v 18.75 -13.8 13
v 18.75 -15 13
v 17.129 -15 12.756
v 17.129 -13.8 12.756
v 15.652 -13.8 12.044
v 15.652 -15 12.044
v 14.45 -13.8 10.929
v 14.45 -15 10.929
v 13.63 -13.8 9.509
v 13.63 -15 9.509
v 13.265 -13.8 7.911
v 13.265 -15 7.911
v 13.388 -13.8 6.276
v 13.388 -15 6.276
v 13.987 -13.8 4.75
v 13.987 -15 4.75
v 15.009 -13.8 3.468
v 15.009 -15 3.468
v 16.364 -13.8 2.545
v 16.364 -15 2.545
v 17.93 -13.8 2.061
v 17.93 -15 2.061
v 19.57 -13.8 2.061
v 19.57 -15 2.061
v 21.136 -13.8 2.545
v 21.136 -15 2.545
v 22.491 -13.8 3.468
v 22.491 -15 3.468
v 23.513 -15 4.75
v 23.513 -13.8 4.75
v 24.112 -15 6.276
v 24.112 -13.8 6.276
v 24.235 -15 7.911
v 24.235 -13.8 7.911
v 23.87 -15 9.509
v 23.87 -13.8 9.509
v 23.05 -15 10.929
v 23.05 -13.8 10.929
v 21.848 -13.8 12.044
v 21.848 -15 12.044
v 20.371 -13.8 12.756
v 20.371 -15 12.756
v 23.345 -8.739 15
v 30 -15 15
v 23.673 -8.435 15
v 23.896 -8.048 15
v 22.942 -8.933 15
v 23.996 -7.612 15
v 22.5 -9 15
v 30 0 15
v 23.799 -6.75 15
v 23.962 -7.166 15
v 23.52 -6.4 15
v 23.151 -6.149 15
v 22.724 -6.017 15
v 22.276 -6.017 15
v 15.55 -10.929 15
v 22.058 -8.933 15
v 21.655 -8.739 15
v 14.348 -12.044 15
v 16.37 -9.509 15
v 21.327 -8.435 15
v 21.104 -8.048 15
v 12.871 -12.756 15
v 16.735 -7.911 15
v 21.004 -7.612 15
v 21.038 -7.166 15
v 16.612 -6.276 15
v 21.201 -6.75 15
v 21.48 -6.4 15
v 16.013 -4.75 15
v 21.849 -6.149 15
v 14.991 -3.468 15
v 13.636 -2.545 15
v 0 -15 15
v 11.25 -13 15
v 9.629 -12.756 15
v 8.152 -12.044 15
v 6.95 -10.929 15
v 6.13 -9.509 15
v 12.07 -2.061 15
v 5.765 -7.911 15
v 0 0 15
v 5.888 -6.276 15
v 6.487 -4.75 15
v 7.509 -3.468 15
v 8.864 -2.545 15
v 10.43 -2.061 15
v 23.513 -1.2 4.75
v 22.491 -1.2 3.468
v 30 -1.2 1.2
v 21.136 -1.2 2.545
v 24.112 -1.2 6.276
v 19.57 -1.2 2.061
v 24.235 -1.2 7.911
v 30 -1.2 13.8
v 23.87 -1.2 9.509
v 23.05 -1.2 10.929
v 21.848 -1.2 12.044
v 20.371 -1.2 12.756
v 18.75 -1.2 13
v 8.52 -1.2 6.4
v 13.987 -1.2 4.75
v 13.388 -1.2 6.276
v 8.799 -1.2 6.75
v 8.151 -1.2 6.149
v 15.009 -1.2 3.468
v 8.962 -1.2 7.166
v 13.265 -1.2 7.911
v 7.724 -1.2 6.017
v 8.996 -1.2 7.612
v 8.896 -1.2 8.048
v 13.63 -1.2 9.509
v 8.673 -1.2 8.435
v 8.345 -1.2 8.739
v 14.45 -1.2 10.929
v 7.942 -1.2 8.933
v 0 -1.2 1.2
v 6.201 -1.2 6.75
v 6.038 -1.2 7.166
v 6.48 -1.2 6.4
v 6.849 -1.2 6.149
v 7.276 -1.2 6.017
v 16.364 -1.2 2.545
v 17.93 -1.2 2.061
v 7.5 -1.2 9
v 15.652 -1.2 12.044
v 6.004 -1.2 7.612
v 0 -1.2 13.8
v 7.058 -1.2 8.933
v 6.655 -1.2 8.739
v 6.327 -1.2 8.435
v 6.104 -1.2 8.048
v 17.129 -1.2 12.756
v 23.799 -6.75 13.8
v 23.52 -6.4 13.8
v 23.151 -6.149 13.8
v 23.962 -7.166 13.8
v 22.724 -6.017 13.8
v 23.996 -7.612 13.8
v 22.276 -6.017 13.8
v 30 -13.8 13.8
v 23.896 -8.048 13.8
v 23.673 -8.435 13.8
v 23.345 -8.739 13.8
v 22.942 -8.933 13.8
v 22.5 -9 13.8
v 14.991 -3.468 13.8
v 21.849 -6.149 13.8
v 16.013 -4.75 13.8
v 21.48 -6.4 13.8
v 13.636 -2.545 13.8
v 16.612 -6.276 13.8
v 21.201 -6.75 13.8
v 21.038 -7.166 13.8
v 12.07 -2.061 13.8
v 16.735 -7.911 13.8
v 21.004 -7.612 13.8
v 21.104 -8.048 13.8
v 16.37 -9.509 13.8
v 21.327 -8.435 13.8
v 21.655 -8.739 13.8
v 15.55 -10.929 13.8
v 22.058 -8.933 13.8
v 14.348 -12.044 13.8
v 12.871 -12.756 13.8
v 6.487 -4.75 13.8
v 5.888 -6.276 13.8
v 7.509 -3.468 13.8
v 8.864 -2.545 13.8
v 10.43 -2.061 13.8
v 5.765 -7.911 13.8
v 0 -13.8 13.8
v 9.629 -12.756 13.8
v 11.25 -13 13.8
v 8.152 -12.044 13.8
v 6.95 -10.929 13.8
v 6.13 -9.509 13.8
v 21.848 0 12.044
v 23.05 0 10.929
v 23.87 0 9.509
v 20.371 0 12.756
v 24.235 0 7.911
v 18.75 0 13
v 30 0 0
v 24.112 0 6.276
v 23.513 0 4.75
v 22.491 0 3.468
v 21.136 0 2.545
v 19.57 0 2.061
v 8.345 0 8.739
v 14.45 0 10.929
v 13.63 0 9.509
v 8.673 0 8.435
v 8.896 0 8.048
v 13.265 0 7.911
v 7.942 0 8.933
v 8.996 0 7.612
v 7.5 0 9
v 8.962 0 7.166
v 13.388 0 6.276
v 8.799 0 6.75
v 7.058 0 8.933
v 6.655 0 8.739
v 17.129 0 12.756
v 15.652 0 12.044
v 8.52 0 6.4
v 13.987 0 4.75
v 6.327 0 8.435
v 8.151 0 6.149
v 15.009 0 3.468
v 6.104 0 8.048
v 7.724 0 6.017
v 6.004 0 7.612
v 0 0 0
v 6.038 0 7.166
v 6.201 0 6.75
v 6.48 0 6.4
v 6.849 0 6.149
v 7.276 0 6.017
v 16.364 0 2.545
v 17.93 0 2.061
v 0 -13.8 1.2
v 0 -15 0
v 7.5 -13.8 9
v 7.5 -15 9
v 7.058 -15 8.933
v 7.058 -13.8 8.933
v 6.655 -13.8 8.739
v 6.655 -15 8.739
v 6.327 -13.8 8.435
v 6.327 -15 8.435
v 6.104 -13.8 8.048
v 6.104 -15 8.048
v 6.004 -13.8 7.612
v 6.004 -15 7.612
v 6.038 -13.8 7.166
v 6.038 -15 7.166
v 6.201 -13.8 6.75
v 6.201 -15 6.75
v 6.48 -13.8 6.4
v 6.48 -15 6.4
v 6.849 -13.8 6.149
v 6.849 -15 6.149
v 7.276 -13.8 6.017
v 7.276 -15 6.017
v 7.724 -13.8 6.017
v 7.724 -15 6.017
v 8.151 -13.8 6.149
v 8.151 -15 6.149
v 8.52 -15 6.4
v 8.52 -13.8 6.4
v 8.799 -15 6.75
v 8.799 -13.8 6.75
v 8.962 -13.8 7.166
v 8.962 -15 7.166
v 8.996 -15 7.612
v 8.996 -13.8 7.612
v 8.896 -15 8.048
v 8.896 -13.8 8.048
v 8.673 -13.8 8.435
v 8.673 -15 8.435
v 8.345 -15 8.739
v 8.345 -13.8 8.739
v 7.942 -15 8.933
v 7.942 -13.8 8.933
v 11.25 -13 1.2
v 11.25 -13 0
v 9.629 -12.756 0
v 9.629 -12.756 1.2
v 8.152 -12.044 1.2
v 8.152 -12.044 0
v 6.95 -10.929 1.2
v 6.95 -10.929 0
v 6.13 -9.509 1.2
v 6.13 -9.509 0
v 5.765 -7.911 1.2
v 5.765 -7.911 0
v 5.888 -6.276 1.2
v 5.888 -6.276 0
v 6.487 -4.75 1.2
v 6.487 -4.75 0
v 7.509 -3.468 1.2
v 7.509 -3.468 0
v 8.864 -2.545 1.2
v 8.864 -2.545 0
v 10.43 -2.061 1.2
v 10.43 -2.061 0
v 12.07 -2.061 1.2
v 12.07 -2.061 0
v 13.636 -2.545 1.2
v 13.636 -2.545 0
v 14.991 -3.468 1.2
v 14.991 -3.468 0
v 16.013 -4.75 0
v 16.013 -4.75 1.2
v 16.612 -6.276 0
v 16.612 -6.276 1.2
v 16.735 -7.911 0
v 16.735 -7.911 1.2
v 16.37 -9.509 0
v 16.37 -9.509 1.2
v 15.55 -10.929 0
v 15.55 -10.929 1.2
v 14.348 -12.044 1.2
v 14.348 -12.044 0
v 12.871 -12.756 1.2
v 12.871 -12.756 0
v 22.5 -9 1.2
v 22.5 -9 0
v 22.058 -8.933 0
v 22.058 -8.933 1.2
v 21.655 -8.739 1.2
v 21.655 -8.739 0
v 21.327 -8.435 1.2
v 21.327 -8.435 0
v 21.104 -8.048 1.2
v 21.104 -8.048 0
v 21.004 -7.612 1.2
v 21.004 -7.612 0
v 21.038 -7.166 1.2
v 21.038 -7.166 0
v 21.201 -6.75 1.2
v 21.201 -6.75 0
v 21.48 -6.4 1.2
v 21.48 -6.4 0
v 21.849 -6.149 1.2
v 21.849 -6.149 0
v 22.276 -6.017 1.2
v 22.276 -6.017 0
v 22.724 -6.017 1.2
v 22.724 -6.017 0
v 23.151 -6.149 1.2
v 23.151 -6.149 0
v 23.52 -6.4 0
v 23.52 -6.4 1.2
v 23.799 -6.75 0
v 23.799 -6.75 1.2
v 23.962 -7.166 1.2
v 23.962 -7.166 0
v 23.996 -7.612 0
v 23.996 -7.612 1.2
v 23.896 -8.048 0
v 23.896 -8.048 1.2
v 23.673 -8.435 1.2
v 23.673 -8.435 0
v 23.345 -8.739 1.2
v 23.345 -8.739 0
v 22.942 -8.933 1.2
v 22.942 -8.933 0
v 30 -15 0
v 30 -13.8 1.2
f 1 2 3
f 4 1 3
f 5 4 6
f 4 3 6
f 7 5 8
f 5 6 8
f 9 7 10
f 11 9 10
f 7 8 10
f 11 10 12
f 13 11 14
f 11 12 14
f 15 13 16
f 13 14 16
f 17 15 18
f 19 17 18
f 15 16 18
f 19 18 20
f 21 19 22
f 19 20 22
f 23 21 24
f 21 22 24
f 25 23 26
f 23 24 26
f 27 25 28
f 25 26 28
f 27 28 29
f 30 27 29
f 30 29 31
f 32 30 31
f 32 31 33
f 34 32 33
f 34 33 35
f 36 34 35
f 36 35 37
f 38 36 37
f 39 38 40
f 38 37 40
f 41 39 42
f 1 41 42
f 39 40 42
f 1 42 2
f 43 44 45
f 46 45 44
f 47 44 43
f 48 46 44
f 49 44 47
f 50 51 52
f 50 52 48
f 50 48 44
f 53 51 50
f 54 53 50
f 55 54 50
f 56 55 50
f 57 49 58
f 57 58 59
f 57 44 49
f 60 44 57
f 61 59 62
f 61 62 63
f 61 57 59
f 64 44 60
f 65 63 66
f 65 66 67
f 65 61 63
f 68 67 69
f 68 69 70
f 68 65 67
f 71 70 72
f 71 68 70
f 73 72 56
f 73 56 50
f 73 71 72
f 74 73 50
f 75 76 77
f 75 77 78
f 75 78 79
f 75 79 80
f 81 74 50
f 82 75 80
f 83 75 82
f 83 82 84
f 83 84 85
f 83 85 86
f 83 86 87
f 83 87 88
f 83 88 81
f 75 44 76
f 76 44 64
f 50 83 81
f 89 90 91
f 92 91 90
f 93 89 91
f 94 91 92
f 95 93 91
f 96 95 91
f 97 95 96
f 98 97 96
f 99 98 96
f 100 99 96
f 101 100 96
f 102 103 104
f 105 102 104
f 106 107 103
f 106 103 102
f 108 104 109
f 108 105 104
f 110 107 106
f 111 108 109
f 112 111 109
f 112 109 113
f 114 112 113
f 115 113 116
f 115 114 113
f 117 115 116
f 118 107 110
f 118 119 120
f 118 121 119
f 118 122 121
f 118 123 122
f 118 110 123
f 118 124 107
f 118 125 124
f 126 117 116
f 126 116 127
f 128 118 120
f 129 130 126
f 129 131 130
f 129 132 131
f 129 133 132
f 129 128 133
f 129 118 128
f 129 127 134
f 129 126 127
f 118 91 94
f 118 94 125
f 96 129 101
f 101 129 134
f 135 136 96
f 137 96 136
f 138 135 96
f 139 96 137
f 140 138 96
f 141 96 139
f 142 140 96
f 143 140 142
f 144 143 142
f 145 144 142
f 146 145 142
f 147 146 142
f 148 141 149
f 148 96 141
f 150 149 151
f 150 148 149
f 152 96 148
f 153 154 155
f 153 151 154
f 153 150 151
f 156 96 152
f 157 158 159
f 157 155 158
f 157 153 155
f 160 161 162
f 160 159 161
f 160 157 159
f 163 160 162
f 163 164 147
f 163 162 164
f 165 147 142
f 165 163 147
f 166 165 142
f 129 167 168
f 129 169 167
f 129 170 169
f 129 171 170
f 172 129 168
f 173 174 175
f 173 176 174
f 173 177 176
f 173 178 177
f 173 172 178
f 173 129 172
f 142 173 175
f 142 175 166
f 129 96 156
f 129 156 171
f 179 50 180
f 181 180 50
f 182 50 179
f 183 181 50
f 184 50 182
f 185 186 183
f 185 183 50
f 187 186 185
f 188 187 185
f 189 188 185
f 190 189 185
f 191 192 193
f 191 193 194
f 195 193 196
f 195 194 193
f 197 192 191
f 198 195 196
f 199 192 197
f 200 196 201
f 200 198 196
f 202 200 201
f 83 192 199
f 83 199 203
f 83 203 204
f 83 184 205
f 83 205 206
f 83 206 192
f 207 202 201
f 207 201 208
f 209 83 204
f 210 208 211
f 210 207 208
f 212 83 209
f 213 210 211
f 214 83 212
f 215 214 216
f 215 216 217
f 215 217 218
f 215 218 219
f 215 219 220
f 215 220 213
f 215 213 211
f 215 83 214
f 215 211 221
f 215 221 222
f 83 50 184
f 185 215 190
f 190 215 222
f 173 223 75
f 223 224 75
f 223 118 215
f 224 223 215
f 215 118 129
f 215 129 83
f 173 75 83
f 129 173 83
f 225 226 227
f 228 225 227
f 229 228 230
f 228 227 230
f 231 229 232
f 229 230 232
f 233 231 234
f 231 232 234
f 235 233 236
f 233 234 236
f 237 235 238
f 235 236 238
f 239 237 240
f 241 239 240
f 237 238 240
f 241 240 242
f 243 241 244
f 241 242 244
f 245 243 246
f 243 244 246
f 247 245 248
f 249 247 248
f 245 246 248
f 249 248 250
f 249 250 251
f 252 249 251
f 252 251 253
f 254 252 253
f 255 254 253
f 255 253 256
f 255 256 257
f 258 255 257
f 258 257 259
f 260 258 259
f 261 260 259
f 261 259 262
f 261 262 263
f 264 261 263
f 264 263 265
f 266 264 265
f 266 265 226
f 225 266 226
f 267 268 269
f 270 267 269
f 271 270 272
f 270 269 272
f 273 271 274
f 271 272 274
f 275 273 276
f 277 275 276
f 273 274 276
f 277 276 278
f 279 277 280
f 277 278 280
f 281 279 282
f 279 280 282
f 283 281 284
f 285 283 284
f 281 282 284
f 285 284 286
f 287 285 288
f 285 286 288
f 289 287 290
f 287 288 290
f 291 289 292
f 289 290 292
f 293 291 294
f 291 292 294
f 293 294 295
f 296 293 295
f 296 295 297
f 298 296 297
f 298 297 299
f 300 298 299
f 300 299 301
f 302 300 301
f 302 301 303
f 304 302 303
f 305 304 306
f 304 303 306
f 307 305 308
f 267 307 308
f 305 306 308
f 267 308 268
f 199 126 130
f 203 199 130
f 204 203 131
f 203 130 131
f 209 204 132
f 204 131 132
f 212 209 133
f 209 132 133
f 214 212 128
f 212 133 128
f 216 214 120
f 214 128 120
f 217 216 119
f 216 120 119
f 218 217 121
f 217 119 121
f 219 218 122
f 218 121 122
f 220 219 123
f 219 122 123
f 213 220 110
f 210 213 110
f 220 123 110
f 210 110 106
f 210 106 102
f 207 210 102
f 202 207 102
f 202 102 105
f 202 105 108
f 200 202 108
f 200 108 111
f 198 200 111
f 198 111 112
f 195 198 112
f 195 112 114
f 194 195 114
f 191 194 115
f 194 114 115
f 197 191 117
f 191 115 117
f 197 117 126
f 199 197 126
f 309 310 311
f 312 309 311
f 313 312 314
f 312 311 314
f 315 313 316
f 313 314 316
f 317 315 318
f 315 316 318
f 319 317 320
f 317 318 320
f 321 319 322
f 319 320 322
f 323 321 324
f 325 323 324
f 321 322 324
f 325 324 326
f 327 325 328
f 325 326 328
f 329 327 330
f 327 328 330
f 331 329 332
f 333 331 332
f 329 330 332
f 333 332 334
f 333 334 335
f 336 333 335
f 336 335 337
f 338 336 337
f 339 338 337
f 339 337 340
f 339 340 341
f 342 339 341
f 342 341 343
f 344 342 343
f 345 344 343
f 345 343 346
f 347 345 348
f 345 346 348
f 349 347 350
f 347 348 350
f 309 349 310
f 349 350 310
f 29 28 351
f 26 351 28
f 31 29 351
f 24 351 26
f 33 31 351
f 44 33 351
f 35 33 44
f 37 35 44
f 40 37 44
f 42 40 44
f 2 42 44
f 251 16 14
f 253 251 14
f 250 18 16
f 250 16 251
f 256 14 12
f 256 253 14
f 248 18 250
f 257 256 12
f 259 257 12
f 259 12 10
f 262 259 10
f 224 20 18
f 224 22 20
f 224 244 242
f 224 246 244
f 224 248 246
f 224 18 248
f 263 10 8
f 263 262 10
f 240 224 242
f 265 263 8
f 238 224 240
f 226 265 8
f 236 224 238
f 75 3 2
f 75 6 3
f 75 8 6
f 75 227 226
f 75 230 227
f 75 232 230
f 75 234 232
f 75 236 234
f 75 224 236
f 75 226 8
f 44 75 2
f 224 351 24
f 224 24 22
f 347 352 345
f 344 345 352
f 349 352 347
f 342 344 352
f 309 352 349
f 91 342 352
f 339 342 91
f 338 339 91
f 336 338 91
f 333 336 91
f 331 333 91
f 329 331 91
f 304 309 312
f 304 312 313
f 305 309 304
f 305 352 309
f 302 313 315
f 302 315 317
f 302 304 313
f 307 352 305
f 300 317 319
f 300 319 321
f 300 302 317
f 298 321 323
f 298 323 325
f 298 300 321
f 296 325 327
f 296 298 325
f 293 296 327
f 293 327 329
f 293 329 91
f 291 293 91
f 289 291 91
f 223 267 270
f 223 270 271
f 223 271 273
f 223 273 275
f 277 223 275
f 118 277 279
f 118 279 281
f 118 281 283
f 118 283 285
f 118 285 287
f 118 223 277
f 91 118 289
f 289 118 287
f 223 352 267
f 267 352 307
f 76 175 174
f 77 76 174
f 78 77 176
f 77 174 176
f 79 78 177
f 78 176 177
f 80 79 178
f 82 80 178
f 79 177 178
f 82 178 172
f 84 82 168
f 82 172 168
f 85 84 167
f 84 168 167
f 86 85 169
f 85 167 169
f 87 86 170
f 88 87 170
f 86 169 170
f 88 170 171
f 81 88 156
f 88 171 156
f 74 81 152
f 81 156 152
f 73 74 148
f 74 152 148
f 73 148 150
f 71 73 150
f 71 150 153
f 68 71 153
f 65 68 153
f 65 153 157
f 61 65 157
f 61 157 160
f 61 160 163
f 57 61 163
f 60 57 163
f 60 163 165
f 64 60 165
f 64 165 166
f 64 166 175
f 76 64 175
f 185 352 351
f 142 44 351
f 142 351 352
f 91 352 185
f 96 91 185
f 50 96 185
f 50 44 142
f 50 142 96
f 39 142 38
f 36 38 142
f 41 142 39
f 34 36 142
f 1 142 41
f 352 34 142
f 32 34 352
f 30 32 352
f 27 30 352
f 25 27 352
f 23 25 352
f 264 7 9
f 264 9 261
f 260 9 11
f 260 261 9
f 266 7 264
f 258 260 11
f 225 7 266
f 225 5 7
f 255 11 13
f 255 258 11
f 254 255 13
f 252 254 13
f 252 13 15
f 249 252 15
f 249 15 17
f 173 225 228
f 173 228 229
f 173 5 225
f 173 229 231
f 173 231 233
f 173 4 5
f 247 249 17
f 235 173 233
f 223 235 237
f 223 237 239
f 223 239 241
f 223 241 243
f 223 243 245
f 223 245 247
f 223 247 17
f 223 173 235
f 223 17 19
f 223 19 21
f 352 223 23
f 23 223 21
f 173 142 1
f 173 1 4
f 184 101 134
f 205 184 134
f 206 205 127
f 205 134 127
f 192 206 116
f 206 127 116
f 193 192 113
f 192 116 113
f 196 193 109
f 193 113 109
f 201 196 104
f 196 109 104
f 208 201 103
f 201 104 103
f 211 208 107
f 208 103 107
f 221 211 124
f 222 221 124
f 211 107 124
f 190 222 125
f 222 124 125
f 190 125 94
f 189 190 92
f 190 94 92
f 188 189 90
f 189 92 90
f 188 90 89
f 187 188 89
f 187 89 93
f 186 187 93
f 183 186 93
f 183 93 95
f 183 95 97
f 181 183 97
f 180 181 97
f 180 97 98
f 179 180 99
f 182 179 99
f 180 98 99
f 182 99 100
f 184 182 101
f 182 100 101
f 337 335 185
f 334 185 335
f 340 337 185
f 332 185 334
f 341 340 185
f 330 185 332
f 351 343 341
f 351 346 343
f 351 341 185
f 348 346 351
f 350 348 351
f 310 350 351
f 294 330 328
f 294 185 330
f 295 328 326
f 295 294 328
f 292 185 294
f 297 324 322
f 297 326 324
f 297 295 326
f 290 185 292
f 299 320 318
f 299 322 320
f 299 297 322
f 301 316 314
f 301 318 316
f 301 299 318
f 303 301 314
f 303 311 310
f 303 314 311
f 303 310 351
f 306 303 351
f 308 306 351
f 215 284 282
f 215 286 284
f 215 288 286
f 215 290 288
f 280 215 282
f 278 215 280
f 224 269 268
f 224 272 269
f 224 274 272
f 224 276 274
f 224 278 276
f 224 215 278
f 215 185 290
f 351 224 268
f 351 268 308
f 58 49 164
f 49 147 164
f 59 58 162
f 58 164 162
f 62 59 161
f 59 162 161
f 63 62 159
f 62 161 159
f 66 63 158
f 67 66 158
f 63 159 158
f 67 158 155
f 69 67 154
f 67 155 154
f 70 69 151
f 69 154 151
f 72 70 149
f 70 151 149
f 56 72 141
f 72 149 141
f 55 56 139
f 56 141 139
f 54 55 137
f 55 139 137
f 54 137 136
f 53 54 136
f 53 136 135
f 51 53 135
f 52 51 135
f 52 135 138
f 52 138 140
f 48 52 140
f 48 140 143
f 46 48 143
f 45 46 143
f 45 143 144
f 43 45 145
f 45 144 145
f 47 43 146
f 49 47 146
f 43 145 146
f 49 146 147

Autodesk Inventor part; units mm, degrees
ref_plane "YZ Plane" through (0, 0, 0) normal (1, 0, 0) x (0, 1, 0)
ref_plane "XZ Plane" through (0, 0, 0) normal (0, 1, 0) x (-1, 0, 0)
ref_plane "XY Plane" through (0, 0, 0) normal (0, 0, 1) x (1, 0, 0)
sketch "スケッチ1" plane through (0, 0, 0) normal (1, 0, 0) x (0, 1, 0)
  line L0 (0, 0) -> (-15, 0)
  line L1 (-15, 0) -> (-15, 15)
  line L2 (-15, 15) -> (0, 15)
  line L3 (0, 15) -> (0, 0)
  line L4 (-13.8, 1.2) -> (-1.2, 1.2)
  line L5 (-1.2, 1.2) -> (-1.2, 13.8)
  line L6 (-1.2, 13.8) -> (-13.8, 13.8)
  line L7 (-13.8, 13.8) -> (-13.8, 1.2)
  dimension "d0" = 15
  dimension "d1" = 15
  dimension "d2" = 1.2
  dimension "d3" = 1.2
  dimension "d4" = 1.2
  dimension "d5" = 1.2
extrude "押し出し1" add sketch "スケッチ1" along normal blind 30
sketch "スケッチ2" plane through (0, -15, 15) normal (0, 0, 1) x (1, 0, 0)
  line L0 (0, 0) -> (30, 0) projected
  line L1 (30, 15) -> (30, 0) projected
  point P0 (0, 15)
  point P1 (22.5, 7.5)
  dimension "d8" = 7.5
  dimension "d9" = 7.5
sketch "スケッチ3" plane through (0, 0, 15) normal (0, 1, 0) x (1, 0, 0)
  line L0 (0, 15) -> (0, 0) projected
  line L1 (0, 15) -> (30, 15) projected
  point P0 (7.5, 7.5)
  dimension "d10" = 7.5
  dimension "d11" = 7.5
hole "穴1" at (22.5, -7.5, 15) direction (0, 0, -1) diameter 3 end through all
hole "穴2" at (7.5, 0, 7.5) direction (0, -1, 0) diameter 3 end through all
sketch "スケッチ4" plane through (0, -15, 15) normal (0, 0, 1) x (1, 0, 0)
  circle A0 centre (22.5, 7.5) radius 1.5 projected
  line L0 (0, 15) -> (0, 0) projected
  line L1 (0, 15) -> (30, 15) projected
  point P0 (11.25, 7.5)
  dimension "d26" = 22.5
  dimension "d27" = 11.25
  dimension "d28" = 7.5
hole "穴3" at (11.25, -7.5, 15) direction (0, 0, -1) diameter 11 end through all
sketch "スケッチ5" plane through (0, 0, 15) normal (0, 1, 0) x (1, 0, 0)
  line L0 (30, 15) -> (30, 0) projected
  circle A0 centre (7.5, 7.5) radius 1.5 projected
  line L1 (0, 15) -> (30, 15) projected
  point P0 (18.75, 7.5)
  dimension "d36" = 22.5
  dimension "d37" = 11.25
  dimension "d38" = 7.5
hole "穴4" at (18.75, 0, 7.5) direction (0, -1, 0) diameter 11 end through all
equation "\"d3\" = d2"
equation "\"d4\" = d3"
equation "\"d5\" = d4"
equation "\"d9\" = d8"
equation "\"d11\" = d10"
equation "\"d27\" = 0.5 * d26"
equation "\"d37\" = 0.5 * d36"
properties part number "ロボットベース15x15x30" material "アルミニウム 6061"
